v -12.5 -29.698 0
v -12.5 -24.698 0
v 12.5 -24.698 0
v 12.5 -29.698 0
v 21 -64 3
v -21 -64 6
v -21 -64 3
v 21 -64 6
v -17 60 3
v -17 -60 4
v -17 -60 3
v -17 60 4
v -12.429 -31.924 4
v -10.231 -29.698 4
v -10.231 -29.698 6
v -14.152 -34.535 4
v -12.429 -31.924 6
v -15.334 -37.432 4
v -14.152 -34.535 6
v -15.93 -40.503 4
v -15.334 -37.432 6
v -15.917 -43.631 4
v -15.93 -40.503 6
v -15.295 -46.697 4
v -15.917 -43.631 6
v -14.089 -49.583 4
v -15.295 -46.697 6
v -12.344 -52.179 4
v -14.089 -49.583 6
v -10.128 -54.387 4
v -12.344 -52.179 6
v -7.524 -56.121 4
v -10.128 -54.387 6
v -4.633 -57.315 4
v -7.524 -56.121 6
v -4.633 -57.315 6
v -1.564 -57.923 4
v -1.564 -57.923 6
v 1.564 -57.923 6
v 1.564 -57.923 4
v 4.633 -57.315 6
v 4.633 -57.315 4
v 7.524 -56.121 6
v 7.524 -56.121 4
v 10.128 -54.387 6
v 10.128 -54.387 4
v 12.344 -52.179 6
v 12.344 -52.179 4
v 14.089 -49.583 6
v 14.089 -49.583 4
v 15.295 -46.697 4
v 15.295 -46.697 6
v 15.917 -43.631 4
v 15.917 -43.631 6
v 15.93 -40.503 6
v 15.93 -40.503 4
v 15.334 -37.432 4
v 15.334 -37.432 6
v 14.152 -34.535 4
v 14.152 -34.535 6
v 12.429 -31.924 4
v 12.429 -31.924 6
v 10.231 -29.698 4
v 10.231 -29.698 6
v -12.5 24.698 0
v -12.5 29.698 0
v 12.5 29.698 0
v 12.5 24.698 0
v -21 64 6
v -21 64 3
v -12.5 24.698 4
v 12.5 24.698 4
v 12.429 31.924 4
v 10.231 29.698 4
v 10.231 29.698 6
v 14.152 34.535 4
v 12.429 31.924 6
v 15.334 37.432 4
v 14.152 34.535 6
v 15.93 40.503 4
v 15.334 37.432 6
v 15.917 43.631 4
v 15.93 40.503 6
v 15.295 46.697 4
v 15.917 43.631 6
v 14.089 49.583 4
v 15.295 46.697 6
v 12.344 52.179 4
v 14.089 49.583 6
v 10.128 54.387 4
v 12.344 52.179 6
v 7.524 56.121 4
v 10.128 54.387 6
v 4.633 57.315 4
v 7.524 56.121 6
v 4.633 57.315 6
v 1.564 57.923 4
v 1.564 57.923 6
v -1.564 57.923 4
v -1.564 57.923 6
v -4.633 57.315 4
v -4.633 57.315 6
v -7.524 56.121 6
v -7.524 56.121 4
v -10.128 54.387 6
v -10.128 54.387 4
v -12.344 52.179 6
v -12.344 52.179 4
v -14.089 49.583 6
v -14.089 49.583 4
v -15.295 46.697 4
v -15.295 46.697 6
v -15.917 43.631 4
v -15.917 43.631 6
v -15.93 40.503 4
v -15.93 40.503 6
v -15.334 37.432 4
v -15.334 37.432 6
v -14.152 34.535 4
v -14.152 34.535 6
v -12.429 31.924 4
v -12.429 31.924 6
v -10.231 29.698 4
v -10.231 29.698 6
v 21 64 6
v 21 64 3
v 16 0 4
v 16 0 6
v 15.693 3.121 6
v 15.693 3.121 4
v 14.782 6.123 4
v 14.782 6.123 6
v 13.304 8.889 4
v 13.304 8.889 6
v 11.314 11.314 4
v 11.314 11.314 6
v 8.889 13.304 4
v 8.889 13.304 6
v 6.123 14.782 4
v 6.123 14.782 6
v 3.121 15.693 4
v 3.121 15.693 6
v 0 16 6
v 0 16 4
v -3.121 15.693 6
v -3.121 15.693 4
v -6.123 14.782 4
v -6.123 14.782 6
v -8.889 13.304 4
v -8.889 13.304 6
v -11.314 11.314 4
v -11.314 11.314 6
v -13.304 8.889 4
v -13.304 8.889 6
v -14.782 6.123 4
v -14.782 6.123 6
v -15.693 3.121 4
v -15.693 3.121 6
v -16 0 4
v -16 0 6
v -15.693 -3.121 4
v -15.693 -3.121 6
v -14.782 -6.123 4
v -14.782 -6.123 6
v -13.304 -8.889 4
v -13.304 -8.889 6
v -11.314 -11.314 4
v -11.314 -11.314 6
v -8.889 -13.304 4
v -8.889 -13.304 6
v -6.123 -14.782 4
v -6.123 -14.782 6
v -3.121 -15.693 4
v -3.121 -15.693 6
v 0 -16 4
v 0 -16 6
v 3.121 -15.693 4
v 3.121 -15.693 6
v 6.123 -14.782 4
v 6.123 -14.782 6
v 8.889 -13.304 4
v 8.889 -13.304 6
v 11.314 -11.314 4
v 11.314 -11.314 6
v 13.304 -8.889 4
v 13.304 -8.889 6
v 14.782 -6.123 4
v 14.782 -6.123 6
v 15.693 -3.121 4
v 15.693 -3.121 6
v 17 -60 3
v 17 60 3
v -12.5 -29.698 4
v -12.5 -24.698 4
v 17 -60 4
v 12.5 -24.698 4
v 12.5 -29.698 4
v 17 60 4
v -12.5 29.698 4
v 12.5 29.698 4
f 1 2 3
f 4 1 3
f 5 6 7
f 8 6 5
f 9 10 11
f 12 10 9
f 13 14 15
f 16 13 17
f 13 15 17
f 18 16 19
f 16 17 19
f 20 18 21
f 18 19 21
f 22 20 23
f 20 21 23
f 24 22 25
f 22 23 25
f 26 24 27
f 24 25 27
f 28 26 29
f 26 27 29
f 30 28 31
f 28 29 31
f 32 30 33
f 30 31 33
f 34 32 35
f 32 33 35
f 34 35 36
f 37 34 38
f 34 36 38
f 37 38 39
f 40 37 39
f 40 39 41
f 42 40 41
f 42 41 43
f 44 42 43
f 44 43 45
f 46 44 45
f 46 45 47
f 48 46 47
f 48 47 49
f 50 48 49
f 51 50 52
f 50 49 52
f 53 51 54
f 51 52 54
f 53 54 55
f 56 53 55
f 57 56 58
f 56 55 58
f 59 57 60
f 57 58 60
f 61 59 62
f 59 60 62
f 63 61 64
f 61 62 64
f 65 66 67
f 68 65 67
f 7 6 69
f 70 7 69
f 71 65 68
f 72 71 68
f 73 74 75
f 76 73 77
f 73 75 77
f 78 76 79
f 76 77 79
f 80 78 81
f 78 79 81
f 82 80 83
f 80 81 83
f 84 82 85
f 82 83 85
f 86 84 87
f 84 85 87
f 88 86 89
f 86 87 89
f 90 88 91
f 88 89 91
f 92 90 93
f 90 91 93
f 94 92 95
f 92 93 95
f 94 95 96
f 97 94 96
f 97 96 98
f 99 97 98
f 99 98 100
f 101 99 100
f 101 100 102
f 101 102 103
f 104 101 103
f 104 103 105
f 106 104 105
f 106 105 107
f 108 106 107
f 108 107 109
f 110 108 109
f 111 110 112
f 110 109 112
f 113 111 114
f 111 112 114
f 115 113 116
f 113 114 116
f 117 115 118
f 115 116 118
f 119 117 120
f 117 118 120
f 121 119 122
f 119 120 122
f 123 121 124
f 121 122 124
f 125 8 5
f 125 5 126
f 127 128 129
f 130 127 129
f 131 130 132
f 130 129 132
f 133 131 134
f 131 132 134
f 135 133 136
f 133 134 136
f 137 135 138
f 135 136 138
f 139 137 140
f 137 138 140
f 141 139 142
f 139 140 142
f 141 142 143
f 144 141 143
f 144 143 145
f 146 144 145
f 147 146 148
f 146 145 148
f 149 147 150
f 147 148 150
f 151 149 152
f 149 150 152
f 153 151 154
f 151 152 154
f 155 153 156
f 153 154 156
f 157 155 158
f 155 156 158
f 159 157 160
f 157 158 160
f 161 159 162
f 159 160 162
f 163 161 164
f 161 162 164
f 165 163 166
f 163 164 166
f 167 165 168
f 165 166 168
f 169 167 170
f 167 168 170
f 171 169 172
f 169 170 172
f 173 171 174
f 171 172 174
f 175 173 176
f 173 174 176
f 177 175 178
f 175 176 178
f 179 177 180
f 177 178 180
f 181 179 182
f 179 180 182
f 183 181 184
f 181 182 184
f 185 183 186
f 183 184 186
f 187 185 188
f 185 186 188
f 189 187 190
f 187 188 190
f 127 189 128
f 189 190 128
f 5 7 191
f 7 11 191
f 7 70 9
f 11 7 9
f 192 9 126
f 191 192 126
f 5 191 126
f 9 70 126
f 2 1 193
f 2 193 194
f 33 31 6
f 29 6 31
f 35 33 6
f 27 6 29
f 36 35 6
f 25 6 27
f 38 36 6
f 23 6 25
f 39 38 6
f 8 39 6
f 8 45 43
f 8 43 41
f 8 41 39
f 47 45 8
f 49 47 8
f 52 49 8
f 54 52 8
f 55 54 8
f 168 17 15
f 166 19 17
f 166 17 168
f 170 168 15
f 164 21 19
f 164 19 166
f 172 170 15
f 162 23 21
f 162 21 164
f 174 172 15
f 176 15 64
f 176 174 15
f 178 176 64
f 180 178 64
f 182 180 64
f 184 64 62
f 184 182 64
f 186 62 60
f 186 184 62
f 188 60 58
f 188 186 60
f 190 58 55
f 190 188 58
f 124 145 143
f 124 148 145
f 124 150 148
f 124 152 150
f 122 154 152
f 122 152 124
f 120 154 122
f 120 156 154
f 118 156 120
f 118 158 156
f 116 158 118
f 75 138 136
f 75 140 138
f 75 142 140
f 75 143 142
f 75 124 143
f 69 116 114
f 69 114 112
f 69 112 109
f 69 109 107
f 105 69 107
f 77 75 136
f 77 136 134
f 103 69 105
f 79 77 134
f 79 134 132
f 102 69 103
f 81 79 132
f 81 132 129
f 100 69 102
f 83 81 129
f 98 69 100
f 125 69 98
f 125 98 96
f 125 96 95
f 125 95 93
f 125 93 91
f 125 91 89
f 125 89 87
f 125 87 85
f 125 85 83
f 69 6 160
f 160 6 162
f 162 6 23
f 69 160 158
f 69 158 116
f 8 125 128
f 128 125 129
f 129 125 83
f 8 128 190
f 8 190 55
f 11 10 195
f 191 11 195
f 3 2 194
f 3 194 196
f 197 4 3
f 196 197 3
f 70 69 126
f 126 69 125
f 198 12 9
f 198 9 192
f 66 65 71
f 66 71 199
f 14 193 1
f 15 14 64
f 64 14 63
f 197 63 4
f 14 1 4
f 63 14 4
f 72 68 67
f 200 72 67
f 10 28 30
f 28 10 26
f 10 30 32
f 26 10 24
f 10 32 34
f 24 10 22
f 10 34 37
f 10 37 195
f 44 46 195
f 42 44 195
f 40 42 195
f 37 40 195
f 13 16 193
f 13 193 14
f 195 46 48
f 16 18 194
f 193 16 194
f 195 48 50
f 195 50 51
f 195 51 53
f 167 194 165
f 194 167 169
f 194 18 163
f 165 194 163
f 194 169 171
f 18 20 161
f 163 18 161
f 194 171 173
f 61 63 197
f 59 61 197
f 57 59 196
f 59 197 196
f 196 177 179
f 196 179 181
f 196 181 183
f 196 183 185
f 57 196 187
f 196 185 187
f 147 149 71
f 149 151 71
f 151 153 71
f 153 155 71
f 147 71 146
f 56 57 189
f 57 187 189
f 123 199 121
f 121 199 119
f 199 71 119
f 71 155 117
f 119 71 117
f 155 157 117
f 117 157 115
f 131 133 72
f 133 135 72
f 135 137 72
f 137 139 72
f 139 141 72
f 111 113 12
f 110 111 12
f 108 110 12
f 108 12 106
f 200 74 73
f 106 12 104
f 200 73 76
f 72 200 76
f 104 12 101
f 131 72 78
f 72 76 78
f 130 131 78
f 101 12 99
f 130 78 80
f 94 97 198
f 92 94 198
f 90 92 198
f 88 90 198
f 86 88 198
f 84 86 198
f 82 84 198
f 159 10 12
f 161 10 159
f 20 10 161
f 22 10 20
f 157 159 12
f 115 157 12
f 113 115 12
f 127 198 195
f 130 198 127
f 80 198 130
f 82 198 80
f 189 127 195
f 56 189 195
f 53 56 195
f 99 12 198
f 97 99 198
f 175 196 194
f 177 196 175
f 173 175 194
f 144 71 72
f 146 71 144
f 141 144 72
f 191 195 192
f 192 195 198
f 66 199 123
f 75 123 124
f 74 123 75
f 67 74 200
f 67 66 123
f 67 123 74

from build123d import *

# Parameters (mm, degrees)
SKETCH1_W             = 25
SKETCH1_H             = 5
BOSS_EXTRUDE1_DEPTH   = 6
BOSS_EXTRUDE1_2_DEPTH = 6
SKETCH2_W             = 42
SKETCH2_H             = 128
SKETCH2_W_2           = 34
SKETCH2_H_2           = 120
BOSS_EXTRUDE2_DEPTH   = 3
SKETCH2_3_W           = 34
SKETCH2_3_H           = 120
SKETCH2_3_R           = 16
BOSS_EXTRUDE3_DEPTH   = 2


with BuildPart() as part:
    # Sketch1 → Boss-Extrude1 (new body)
    with BuildSketch(Plane.XY):
        with Locations((0, -27.19848481)):
            Rectangle(SKETCH1_W, SKETCH1_H)
    extrude(amount=BOSS_EXTRUDE1_DEPTH)



with BuildPart() as body_2:
    # Sketch1 → Boss-Extrude1 2 (new body)
    with BuildSketch(Plane.XY):
        with Locations((0, 27.19848481)):
            Rectangle(SKETCH1_W, SKETCH1_H)
    extrude(amount=BOSS_EXTRUDE1_2_DEPTH)


with BuildPart() as body_3:
    # Sketch2 → Boss-Extrude2 (new body)
    with BuildSketch(Plane.XY.offset(6)):
        Rectangle(SKETCH2_W, SKETCH2_H)
        Rectangle(SKETCH2_W_2, SKETCH2_H_2, mode=Mode.SUBTRACT)
    extrude(amount=-BOSS_EXTRUDE2_DEPTH)


with BuildPart() as part_1:
    add(part.part)

    add(body_2.part)  # Boss-Extrude3 merges body 2

    add(body_3.part)  # Boss-Extrude3 merges body 3
    # Sketch2<3> → Boss-Extrude3 (add)
    with BuildSketch(Plane.XY.offset(6)):
        Rectangle(SKETCH2_3_W, SKETCH2_3_H)
        with BuildLine():
            ThreePointArc((10.23096887, -29.69848481), (14.486122703, -35.206455341), (16, -42))
            ThreePointArc((16, -42), (-6.793544659, -56.486122703), (-10.23096887, -29.69848481))
            Line((-10.23096887, -29.69848481), (-12.5, -29.69848481))
            Line((-12.5, -29.69848481), (-12.5, -24.69848481))
            Line((-12.5, -24.69848481), (12.5, -24.69848481))
            Line((12.5, -24.69848481), (12.5, -29.69848481))
            Line((12.5, -29.69848481), (10.23096887, -29.69848481))
        make_face(mode=Mode.SUBTRACT)
        with Locations((0, 42)):
            Circle(SKETCH2_3_R, mode=Mode.SUBTRACT)
        Circle(SKETCH2_3_R, mode=Mode.SUBTRACT)
    extrude(amount=-BOSS_EXTRUDE3_DEPTH)


solid = part_1.part
